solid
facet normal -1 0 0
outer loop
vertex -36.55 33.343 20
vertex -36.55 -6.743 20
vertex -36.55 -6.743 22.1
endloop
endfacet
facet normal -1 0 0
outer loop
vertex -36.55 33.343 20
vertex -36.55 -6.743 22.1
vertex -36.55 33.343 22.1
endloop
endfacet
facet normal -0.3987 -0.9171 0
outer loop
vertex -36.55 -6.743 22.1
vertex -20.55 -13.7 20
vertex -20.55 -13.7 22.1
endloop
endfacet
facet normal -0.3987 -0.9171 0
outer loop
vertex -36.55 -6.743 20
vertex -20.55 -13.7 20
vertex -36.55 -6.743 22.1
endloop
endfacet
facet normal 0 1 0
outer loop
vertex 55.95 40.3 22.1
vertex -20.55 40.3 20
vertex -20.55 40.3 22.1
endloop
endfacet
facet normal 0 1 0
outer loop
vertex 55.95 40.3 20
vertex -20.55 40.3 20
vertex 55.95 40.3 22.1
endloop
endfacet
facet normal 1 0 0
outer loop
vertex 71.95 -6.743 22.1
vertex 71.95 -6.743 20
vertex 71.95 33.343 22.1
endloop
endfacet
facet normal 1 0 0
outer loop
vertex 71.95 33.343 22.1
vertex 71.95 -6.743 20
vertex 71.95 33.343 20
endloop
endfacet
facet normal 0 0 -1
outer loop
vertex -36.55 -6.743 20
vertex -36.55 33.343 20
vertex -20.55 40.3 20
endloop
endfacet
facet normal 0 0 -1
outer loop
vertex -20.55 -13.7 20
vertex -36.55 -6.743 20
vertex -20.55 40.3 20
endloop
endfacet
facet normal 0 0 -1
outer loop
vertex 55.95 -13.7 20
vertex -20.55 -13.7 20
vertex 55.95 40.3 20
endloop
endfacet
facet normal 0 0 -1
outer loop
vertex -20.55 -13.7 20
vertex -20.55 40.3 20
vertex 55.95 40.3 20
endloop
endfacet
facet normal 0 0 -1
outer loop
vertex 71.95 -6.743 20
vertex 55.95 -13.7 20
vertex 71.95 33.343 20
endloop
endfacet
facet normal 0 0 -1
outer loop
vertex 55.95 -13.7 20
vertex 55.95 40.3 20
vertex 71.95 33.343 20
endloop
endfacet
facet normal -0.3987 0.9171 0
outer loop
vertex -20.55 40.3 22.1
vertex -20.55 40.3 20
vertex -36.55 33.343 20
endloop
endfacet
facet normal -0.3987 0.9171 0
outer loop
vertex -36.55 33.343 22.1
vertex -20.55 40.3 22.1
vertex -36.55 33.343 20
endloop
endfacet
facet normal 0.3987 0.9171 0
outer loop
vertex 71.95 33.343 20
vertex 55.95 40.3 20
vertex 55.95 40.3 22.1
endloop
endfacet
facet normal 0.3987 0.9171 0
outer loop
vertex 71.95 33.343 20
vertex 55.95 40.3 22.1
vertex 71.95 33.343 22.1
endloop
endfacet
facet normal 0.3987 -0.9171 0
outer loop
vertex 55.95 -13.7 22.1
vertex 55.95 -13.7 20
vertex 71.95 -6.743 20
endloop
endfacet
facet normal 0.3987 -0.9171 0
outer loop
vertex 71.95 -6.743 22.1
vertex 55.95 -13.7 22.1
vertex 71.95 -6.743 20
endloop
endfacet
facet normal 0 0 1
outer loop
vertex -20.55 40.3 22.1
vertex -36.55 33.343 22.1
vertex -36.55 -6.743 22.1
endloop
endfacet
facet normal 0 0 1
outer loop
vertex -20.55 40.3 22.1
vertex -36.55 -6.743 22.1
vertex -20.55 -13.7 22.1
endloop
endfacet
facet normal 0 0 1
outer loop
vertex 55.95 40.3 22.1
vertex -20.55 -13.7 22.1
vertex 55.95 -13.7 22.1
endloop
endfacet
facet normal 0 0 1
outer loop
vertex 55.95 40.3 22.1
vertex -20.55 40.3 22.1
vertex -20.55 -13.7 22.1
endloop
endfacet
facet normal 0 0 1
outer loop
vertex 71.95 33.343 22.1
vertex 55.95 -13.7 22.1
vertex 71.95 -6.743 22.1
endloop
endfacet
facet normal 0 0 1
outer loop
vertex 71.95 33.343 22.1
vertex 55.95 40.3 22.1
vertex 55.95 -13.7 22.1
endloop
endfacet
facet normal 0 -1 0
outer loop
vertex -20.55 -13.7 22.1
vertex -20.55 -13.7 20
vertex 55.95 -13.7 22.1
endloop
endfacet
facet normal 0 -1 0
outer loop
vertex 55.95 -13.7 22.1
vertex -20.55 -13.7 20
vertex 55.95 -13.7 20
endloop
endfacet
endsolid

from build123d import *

# Parameters (mm, degrees)
BOX004_W               = 20
BOX004_H               = 10
BOX004_DEPTH           = 10
BOX004_PLACEMENT_ANGLE = 156.5
BOX006_W               = 20
BOX006_H               = 10
BOX006_DEPTH           = 10
BOX006_PLACEMENT_ANGLE = 23.5
BOX007_W               = 20
BOX007_H               = 10
BOX007_DEPTH           = 10
BOX007_PLACEMENT_ANGLE = -23.5
BOX005_W               = 20
BOX005_H               = 10
BOX005_DEPTH           = 10
BOX005_PLACEMENT_ANGLE = 203.5
BOX001_W               = 108.5
BOX001_H               = 54
BOX001_DEPTH           = 2.1


with BuildPart() as cube004:
    # Box004 → Box004 (new body)
    with BuildSketch(Plane.XY):
        with Locations((10, 5)):
            Rectangle(BOX004_W, BOX004_H)
    extrude(amount=BOX004_DEPTH)


with BuildPart() as cube004_1:
    # Box004 placement: moved
    add(cube004.part.moved(Location((16, 0, 0))).rotate(Axis((16, 0, 0), (0, 0, 1)), BOX004_PLACEMENT_ANGLE))


with BuildPart() as cube006:
    # Box006 → Box006 (new body)
    with BuildSketch(Plane.XY):
        with Locations((10, 5)):
            Rectangle(BOX006_W, BOX006_H)
    extrude(amount=BOX006_DEPTH)


with BuildPart() as cube006_1:
    # Box006 placement: moved
    add(cube006.part.moved(Location((94.5, -10.035, 0))).rotate(Axis((94.5, -10.035, 0), (0, 0, 1)), BOX006_PLACEMENT_ANGLE))


with BuildPart() as cube007:
    # Box007 → Box007 (new body)
    with BuildSketch(Plane.XY):
        with Locations((10, 5)):
            Rectangle(BOX007_W, BOX007_H)
    extrude(amount=BOX007_DEPTH)


with BuildPart() as cube007_1:
    # Box007 placement: moved
    add(cube007.part.moved(Location((92.5, 54, 0))).rotate(Axis((92.5, 54, 0), (0, 0, 1)), BOX007_PLACEMENT_ANGLE))


with BuildPart() as cube005:
    # Box005 → Box005 (new body)
    with BuildSketch(Plane.XY):
        with Locations((10, 5)):
            Rectangle(BOX005_W, BOX005_H)
    extrude(amount=BOX005_DEPTH)


with BuildPart() as cube005_1:
    # Box005 placement: moved
    add(cube005.part.moved(Location((14, 64.0348, 0))).rotate(Axis((14, 64.0348, 0), (0, 0, 1)), BOX005_PLACEMENT_ANGLE))


with BuildPart() as g1020bf_bottom_lid:
    # Box001 → Box001 (new body)
    with BuildSketch(Plane.XY):
        with Locations((54.25, 27)):
            Rectangle(BOX001_W, BOX001_H)
    extrude(amount=BOX001_DEPTH)

    # Cut001: cut Cube005
    add(cube005_1.part, mode=Mode.SUBTRACT)

    # Cut002: cut Cube007
    add(cube007_1.part, mode=Mode.SUBTRACT)

    # Cut003: cut Cube006
    add(cube006_1.part, mode=Mode.SUBTRACT)

    # Cut004: cut Cube004
    add(cube004_1.part, mode=Mode.SUBTRACT)


with BuildPart() as g1020bf_bottom_lid_1:
    # Cut004 placement: moved
    add(g1020bf_bottom_lid.part.moved(Location((-36.55, -13.7, 20))))


solid = g1020bf_bottom_lid_1.part
